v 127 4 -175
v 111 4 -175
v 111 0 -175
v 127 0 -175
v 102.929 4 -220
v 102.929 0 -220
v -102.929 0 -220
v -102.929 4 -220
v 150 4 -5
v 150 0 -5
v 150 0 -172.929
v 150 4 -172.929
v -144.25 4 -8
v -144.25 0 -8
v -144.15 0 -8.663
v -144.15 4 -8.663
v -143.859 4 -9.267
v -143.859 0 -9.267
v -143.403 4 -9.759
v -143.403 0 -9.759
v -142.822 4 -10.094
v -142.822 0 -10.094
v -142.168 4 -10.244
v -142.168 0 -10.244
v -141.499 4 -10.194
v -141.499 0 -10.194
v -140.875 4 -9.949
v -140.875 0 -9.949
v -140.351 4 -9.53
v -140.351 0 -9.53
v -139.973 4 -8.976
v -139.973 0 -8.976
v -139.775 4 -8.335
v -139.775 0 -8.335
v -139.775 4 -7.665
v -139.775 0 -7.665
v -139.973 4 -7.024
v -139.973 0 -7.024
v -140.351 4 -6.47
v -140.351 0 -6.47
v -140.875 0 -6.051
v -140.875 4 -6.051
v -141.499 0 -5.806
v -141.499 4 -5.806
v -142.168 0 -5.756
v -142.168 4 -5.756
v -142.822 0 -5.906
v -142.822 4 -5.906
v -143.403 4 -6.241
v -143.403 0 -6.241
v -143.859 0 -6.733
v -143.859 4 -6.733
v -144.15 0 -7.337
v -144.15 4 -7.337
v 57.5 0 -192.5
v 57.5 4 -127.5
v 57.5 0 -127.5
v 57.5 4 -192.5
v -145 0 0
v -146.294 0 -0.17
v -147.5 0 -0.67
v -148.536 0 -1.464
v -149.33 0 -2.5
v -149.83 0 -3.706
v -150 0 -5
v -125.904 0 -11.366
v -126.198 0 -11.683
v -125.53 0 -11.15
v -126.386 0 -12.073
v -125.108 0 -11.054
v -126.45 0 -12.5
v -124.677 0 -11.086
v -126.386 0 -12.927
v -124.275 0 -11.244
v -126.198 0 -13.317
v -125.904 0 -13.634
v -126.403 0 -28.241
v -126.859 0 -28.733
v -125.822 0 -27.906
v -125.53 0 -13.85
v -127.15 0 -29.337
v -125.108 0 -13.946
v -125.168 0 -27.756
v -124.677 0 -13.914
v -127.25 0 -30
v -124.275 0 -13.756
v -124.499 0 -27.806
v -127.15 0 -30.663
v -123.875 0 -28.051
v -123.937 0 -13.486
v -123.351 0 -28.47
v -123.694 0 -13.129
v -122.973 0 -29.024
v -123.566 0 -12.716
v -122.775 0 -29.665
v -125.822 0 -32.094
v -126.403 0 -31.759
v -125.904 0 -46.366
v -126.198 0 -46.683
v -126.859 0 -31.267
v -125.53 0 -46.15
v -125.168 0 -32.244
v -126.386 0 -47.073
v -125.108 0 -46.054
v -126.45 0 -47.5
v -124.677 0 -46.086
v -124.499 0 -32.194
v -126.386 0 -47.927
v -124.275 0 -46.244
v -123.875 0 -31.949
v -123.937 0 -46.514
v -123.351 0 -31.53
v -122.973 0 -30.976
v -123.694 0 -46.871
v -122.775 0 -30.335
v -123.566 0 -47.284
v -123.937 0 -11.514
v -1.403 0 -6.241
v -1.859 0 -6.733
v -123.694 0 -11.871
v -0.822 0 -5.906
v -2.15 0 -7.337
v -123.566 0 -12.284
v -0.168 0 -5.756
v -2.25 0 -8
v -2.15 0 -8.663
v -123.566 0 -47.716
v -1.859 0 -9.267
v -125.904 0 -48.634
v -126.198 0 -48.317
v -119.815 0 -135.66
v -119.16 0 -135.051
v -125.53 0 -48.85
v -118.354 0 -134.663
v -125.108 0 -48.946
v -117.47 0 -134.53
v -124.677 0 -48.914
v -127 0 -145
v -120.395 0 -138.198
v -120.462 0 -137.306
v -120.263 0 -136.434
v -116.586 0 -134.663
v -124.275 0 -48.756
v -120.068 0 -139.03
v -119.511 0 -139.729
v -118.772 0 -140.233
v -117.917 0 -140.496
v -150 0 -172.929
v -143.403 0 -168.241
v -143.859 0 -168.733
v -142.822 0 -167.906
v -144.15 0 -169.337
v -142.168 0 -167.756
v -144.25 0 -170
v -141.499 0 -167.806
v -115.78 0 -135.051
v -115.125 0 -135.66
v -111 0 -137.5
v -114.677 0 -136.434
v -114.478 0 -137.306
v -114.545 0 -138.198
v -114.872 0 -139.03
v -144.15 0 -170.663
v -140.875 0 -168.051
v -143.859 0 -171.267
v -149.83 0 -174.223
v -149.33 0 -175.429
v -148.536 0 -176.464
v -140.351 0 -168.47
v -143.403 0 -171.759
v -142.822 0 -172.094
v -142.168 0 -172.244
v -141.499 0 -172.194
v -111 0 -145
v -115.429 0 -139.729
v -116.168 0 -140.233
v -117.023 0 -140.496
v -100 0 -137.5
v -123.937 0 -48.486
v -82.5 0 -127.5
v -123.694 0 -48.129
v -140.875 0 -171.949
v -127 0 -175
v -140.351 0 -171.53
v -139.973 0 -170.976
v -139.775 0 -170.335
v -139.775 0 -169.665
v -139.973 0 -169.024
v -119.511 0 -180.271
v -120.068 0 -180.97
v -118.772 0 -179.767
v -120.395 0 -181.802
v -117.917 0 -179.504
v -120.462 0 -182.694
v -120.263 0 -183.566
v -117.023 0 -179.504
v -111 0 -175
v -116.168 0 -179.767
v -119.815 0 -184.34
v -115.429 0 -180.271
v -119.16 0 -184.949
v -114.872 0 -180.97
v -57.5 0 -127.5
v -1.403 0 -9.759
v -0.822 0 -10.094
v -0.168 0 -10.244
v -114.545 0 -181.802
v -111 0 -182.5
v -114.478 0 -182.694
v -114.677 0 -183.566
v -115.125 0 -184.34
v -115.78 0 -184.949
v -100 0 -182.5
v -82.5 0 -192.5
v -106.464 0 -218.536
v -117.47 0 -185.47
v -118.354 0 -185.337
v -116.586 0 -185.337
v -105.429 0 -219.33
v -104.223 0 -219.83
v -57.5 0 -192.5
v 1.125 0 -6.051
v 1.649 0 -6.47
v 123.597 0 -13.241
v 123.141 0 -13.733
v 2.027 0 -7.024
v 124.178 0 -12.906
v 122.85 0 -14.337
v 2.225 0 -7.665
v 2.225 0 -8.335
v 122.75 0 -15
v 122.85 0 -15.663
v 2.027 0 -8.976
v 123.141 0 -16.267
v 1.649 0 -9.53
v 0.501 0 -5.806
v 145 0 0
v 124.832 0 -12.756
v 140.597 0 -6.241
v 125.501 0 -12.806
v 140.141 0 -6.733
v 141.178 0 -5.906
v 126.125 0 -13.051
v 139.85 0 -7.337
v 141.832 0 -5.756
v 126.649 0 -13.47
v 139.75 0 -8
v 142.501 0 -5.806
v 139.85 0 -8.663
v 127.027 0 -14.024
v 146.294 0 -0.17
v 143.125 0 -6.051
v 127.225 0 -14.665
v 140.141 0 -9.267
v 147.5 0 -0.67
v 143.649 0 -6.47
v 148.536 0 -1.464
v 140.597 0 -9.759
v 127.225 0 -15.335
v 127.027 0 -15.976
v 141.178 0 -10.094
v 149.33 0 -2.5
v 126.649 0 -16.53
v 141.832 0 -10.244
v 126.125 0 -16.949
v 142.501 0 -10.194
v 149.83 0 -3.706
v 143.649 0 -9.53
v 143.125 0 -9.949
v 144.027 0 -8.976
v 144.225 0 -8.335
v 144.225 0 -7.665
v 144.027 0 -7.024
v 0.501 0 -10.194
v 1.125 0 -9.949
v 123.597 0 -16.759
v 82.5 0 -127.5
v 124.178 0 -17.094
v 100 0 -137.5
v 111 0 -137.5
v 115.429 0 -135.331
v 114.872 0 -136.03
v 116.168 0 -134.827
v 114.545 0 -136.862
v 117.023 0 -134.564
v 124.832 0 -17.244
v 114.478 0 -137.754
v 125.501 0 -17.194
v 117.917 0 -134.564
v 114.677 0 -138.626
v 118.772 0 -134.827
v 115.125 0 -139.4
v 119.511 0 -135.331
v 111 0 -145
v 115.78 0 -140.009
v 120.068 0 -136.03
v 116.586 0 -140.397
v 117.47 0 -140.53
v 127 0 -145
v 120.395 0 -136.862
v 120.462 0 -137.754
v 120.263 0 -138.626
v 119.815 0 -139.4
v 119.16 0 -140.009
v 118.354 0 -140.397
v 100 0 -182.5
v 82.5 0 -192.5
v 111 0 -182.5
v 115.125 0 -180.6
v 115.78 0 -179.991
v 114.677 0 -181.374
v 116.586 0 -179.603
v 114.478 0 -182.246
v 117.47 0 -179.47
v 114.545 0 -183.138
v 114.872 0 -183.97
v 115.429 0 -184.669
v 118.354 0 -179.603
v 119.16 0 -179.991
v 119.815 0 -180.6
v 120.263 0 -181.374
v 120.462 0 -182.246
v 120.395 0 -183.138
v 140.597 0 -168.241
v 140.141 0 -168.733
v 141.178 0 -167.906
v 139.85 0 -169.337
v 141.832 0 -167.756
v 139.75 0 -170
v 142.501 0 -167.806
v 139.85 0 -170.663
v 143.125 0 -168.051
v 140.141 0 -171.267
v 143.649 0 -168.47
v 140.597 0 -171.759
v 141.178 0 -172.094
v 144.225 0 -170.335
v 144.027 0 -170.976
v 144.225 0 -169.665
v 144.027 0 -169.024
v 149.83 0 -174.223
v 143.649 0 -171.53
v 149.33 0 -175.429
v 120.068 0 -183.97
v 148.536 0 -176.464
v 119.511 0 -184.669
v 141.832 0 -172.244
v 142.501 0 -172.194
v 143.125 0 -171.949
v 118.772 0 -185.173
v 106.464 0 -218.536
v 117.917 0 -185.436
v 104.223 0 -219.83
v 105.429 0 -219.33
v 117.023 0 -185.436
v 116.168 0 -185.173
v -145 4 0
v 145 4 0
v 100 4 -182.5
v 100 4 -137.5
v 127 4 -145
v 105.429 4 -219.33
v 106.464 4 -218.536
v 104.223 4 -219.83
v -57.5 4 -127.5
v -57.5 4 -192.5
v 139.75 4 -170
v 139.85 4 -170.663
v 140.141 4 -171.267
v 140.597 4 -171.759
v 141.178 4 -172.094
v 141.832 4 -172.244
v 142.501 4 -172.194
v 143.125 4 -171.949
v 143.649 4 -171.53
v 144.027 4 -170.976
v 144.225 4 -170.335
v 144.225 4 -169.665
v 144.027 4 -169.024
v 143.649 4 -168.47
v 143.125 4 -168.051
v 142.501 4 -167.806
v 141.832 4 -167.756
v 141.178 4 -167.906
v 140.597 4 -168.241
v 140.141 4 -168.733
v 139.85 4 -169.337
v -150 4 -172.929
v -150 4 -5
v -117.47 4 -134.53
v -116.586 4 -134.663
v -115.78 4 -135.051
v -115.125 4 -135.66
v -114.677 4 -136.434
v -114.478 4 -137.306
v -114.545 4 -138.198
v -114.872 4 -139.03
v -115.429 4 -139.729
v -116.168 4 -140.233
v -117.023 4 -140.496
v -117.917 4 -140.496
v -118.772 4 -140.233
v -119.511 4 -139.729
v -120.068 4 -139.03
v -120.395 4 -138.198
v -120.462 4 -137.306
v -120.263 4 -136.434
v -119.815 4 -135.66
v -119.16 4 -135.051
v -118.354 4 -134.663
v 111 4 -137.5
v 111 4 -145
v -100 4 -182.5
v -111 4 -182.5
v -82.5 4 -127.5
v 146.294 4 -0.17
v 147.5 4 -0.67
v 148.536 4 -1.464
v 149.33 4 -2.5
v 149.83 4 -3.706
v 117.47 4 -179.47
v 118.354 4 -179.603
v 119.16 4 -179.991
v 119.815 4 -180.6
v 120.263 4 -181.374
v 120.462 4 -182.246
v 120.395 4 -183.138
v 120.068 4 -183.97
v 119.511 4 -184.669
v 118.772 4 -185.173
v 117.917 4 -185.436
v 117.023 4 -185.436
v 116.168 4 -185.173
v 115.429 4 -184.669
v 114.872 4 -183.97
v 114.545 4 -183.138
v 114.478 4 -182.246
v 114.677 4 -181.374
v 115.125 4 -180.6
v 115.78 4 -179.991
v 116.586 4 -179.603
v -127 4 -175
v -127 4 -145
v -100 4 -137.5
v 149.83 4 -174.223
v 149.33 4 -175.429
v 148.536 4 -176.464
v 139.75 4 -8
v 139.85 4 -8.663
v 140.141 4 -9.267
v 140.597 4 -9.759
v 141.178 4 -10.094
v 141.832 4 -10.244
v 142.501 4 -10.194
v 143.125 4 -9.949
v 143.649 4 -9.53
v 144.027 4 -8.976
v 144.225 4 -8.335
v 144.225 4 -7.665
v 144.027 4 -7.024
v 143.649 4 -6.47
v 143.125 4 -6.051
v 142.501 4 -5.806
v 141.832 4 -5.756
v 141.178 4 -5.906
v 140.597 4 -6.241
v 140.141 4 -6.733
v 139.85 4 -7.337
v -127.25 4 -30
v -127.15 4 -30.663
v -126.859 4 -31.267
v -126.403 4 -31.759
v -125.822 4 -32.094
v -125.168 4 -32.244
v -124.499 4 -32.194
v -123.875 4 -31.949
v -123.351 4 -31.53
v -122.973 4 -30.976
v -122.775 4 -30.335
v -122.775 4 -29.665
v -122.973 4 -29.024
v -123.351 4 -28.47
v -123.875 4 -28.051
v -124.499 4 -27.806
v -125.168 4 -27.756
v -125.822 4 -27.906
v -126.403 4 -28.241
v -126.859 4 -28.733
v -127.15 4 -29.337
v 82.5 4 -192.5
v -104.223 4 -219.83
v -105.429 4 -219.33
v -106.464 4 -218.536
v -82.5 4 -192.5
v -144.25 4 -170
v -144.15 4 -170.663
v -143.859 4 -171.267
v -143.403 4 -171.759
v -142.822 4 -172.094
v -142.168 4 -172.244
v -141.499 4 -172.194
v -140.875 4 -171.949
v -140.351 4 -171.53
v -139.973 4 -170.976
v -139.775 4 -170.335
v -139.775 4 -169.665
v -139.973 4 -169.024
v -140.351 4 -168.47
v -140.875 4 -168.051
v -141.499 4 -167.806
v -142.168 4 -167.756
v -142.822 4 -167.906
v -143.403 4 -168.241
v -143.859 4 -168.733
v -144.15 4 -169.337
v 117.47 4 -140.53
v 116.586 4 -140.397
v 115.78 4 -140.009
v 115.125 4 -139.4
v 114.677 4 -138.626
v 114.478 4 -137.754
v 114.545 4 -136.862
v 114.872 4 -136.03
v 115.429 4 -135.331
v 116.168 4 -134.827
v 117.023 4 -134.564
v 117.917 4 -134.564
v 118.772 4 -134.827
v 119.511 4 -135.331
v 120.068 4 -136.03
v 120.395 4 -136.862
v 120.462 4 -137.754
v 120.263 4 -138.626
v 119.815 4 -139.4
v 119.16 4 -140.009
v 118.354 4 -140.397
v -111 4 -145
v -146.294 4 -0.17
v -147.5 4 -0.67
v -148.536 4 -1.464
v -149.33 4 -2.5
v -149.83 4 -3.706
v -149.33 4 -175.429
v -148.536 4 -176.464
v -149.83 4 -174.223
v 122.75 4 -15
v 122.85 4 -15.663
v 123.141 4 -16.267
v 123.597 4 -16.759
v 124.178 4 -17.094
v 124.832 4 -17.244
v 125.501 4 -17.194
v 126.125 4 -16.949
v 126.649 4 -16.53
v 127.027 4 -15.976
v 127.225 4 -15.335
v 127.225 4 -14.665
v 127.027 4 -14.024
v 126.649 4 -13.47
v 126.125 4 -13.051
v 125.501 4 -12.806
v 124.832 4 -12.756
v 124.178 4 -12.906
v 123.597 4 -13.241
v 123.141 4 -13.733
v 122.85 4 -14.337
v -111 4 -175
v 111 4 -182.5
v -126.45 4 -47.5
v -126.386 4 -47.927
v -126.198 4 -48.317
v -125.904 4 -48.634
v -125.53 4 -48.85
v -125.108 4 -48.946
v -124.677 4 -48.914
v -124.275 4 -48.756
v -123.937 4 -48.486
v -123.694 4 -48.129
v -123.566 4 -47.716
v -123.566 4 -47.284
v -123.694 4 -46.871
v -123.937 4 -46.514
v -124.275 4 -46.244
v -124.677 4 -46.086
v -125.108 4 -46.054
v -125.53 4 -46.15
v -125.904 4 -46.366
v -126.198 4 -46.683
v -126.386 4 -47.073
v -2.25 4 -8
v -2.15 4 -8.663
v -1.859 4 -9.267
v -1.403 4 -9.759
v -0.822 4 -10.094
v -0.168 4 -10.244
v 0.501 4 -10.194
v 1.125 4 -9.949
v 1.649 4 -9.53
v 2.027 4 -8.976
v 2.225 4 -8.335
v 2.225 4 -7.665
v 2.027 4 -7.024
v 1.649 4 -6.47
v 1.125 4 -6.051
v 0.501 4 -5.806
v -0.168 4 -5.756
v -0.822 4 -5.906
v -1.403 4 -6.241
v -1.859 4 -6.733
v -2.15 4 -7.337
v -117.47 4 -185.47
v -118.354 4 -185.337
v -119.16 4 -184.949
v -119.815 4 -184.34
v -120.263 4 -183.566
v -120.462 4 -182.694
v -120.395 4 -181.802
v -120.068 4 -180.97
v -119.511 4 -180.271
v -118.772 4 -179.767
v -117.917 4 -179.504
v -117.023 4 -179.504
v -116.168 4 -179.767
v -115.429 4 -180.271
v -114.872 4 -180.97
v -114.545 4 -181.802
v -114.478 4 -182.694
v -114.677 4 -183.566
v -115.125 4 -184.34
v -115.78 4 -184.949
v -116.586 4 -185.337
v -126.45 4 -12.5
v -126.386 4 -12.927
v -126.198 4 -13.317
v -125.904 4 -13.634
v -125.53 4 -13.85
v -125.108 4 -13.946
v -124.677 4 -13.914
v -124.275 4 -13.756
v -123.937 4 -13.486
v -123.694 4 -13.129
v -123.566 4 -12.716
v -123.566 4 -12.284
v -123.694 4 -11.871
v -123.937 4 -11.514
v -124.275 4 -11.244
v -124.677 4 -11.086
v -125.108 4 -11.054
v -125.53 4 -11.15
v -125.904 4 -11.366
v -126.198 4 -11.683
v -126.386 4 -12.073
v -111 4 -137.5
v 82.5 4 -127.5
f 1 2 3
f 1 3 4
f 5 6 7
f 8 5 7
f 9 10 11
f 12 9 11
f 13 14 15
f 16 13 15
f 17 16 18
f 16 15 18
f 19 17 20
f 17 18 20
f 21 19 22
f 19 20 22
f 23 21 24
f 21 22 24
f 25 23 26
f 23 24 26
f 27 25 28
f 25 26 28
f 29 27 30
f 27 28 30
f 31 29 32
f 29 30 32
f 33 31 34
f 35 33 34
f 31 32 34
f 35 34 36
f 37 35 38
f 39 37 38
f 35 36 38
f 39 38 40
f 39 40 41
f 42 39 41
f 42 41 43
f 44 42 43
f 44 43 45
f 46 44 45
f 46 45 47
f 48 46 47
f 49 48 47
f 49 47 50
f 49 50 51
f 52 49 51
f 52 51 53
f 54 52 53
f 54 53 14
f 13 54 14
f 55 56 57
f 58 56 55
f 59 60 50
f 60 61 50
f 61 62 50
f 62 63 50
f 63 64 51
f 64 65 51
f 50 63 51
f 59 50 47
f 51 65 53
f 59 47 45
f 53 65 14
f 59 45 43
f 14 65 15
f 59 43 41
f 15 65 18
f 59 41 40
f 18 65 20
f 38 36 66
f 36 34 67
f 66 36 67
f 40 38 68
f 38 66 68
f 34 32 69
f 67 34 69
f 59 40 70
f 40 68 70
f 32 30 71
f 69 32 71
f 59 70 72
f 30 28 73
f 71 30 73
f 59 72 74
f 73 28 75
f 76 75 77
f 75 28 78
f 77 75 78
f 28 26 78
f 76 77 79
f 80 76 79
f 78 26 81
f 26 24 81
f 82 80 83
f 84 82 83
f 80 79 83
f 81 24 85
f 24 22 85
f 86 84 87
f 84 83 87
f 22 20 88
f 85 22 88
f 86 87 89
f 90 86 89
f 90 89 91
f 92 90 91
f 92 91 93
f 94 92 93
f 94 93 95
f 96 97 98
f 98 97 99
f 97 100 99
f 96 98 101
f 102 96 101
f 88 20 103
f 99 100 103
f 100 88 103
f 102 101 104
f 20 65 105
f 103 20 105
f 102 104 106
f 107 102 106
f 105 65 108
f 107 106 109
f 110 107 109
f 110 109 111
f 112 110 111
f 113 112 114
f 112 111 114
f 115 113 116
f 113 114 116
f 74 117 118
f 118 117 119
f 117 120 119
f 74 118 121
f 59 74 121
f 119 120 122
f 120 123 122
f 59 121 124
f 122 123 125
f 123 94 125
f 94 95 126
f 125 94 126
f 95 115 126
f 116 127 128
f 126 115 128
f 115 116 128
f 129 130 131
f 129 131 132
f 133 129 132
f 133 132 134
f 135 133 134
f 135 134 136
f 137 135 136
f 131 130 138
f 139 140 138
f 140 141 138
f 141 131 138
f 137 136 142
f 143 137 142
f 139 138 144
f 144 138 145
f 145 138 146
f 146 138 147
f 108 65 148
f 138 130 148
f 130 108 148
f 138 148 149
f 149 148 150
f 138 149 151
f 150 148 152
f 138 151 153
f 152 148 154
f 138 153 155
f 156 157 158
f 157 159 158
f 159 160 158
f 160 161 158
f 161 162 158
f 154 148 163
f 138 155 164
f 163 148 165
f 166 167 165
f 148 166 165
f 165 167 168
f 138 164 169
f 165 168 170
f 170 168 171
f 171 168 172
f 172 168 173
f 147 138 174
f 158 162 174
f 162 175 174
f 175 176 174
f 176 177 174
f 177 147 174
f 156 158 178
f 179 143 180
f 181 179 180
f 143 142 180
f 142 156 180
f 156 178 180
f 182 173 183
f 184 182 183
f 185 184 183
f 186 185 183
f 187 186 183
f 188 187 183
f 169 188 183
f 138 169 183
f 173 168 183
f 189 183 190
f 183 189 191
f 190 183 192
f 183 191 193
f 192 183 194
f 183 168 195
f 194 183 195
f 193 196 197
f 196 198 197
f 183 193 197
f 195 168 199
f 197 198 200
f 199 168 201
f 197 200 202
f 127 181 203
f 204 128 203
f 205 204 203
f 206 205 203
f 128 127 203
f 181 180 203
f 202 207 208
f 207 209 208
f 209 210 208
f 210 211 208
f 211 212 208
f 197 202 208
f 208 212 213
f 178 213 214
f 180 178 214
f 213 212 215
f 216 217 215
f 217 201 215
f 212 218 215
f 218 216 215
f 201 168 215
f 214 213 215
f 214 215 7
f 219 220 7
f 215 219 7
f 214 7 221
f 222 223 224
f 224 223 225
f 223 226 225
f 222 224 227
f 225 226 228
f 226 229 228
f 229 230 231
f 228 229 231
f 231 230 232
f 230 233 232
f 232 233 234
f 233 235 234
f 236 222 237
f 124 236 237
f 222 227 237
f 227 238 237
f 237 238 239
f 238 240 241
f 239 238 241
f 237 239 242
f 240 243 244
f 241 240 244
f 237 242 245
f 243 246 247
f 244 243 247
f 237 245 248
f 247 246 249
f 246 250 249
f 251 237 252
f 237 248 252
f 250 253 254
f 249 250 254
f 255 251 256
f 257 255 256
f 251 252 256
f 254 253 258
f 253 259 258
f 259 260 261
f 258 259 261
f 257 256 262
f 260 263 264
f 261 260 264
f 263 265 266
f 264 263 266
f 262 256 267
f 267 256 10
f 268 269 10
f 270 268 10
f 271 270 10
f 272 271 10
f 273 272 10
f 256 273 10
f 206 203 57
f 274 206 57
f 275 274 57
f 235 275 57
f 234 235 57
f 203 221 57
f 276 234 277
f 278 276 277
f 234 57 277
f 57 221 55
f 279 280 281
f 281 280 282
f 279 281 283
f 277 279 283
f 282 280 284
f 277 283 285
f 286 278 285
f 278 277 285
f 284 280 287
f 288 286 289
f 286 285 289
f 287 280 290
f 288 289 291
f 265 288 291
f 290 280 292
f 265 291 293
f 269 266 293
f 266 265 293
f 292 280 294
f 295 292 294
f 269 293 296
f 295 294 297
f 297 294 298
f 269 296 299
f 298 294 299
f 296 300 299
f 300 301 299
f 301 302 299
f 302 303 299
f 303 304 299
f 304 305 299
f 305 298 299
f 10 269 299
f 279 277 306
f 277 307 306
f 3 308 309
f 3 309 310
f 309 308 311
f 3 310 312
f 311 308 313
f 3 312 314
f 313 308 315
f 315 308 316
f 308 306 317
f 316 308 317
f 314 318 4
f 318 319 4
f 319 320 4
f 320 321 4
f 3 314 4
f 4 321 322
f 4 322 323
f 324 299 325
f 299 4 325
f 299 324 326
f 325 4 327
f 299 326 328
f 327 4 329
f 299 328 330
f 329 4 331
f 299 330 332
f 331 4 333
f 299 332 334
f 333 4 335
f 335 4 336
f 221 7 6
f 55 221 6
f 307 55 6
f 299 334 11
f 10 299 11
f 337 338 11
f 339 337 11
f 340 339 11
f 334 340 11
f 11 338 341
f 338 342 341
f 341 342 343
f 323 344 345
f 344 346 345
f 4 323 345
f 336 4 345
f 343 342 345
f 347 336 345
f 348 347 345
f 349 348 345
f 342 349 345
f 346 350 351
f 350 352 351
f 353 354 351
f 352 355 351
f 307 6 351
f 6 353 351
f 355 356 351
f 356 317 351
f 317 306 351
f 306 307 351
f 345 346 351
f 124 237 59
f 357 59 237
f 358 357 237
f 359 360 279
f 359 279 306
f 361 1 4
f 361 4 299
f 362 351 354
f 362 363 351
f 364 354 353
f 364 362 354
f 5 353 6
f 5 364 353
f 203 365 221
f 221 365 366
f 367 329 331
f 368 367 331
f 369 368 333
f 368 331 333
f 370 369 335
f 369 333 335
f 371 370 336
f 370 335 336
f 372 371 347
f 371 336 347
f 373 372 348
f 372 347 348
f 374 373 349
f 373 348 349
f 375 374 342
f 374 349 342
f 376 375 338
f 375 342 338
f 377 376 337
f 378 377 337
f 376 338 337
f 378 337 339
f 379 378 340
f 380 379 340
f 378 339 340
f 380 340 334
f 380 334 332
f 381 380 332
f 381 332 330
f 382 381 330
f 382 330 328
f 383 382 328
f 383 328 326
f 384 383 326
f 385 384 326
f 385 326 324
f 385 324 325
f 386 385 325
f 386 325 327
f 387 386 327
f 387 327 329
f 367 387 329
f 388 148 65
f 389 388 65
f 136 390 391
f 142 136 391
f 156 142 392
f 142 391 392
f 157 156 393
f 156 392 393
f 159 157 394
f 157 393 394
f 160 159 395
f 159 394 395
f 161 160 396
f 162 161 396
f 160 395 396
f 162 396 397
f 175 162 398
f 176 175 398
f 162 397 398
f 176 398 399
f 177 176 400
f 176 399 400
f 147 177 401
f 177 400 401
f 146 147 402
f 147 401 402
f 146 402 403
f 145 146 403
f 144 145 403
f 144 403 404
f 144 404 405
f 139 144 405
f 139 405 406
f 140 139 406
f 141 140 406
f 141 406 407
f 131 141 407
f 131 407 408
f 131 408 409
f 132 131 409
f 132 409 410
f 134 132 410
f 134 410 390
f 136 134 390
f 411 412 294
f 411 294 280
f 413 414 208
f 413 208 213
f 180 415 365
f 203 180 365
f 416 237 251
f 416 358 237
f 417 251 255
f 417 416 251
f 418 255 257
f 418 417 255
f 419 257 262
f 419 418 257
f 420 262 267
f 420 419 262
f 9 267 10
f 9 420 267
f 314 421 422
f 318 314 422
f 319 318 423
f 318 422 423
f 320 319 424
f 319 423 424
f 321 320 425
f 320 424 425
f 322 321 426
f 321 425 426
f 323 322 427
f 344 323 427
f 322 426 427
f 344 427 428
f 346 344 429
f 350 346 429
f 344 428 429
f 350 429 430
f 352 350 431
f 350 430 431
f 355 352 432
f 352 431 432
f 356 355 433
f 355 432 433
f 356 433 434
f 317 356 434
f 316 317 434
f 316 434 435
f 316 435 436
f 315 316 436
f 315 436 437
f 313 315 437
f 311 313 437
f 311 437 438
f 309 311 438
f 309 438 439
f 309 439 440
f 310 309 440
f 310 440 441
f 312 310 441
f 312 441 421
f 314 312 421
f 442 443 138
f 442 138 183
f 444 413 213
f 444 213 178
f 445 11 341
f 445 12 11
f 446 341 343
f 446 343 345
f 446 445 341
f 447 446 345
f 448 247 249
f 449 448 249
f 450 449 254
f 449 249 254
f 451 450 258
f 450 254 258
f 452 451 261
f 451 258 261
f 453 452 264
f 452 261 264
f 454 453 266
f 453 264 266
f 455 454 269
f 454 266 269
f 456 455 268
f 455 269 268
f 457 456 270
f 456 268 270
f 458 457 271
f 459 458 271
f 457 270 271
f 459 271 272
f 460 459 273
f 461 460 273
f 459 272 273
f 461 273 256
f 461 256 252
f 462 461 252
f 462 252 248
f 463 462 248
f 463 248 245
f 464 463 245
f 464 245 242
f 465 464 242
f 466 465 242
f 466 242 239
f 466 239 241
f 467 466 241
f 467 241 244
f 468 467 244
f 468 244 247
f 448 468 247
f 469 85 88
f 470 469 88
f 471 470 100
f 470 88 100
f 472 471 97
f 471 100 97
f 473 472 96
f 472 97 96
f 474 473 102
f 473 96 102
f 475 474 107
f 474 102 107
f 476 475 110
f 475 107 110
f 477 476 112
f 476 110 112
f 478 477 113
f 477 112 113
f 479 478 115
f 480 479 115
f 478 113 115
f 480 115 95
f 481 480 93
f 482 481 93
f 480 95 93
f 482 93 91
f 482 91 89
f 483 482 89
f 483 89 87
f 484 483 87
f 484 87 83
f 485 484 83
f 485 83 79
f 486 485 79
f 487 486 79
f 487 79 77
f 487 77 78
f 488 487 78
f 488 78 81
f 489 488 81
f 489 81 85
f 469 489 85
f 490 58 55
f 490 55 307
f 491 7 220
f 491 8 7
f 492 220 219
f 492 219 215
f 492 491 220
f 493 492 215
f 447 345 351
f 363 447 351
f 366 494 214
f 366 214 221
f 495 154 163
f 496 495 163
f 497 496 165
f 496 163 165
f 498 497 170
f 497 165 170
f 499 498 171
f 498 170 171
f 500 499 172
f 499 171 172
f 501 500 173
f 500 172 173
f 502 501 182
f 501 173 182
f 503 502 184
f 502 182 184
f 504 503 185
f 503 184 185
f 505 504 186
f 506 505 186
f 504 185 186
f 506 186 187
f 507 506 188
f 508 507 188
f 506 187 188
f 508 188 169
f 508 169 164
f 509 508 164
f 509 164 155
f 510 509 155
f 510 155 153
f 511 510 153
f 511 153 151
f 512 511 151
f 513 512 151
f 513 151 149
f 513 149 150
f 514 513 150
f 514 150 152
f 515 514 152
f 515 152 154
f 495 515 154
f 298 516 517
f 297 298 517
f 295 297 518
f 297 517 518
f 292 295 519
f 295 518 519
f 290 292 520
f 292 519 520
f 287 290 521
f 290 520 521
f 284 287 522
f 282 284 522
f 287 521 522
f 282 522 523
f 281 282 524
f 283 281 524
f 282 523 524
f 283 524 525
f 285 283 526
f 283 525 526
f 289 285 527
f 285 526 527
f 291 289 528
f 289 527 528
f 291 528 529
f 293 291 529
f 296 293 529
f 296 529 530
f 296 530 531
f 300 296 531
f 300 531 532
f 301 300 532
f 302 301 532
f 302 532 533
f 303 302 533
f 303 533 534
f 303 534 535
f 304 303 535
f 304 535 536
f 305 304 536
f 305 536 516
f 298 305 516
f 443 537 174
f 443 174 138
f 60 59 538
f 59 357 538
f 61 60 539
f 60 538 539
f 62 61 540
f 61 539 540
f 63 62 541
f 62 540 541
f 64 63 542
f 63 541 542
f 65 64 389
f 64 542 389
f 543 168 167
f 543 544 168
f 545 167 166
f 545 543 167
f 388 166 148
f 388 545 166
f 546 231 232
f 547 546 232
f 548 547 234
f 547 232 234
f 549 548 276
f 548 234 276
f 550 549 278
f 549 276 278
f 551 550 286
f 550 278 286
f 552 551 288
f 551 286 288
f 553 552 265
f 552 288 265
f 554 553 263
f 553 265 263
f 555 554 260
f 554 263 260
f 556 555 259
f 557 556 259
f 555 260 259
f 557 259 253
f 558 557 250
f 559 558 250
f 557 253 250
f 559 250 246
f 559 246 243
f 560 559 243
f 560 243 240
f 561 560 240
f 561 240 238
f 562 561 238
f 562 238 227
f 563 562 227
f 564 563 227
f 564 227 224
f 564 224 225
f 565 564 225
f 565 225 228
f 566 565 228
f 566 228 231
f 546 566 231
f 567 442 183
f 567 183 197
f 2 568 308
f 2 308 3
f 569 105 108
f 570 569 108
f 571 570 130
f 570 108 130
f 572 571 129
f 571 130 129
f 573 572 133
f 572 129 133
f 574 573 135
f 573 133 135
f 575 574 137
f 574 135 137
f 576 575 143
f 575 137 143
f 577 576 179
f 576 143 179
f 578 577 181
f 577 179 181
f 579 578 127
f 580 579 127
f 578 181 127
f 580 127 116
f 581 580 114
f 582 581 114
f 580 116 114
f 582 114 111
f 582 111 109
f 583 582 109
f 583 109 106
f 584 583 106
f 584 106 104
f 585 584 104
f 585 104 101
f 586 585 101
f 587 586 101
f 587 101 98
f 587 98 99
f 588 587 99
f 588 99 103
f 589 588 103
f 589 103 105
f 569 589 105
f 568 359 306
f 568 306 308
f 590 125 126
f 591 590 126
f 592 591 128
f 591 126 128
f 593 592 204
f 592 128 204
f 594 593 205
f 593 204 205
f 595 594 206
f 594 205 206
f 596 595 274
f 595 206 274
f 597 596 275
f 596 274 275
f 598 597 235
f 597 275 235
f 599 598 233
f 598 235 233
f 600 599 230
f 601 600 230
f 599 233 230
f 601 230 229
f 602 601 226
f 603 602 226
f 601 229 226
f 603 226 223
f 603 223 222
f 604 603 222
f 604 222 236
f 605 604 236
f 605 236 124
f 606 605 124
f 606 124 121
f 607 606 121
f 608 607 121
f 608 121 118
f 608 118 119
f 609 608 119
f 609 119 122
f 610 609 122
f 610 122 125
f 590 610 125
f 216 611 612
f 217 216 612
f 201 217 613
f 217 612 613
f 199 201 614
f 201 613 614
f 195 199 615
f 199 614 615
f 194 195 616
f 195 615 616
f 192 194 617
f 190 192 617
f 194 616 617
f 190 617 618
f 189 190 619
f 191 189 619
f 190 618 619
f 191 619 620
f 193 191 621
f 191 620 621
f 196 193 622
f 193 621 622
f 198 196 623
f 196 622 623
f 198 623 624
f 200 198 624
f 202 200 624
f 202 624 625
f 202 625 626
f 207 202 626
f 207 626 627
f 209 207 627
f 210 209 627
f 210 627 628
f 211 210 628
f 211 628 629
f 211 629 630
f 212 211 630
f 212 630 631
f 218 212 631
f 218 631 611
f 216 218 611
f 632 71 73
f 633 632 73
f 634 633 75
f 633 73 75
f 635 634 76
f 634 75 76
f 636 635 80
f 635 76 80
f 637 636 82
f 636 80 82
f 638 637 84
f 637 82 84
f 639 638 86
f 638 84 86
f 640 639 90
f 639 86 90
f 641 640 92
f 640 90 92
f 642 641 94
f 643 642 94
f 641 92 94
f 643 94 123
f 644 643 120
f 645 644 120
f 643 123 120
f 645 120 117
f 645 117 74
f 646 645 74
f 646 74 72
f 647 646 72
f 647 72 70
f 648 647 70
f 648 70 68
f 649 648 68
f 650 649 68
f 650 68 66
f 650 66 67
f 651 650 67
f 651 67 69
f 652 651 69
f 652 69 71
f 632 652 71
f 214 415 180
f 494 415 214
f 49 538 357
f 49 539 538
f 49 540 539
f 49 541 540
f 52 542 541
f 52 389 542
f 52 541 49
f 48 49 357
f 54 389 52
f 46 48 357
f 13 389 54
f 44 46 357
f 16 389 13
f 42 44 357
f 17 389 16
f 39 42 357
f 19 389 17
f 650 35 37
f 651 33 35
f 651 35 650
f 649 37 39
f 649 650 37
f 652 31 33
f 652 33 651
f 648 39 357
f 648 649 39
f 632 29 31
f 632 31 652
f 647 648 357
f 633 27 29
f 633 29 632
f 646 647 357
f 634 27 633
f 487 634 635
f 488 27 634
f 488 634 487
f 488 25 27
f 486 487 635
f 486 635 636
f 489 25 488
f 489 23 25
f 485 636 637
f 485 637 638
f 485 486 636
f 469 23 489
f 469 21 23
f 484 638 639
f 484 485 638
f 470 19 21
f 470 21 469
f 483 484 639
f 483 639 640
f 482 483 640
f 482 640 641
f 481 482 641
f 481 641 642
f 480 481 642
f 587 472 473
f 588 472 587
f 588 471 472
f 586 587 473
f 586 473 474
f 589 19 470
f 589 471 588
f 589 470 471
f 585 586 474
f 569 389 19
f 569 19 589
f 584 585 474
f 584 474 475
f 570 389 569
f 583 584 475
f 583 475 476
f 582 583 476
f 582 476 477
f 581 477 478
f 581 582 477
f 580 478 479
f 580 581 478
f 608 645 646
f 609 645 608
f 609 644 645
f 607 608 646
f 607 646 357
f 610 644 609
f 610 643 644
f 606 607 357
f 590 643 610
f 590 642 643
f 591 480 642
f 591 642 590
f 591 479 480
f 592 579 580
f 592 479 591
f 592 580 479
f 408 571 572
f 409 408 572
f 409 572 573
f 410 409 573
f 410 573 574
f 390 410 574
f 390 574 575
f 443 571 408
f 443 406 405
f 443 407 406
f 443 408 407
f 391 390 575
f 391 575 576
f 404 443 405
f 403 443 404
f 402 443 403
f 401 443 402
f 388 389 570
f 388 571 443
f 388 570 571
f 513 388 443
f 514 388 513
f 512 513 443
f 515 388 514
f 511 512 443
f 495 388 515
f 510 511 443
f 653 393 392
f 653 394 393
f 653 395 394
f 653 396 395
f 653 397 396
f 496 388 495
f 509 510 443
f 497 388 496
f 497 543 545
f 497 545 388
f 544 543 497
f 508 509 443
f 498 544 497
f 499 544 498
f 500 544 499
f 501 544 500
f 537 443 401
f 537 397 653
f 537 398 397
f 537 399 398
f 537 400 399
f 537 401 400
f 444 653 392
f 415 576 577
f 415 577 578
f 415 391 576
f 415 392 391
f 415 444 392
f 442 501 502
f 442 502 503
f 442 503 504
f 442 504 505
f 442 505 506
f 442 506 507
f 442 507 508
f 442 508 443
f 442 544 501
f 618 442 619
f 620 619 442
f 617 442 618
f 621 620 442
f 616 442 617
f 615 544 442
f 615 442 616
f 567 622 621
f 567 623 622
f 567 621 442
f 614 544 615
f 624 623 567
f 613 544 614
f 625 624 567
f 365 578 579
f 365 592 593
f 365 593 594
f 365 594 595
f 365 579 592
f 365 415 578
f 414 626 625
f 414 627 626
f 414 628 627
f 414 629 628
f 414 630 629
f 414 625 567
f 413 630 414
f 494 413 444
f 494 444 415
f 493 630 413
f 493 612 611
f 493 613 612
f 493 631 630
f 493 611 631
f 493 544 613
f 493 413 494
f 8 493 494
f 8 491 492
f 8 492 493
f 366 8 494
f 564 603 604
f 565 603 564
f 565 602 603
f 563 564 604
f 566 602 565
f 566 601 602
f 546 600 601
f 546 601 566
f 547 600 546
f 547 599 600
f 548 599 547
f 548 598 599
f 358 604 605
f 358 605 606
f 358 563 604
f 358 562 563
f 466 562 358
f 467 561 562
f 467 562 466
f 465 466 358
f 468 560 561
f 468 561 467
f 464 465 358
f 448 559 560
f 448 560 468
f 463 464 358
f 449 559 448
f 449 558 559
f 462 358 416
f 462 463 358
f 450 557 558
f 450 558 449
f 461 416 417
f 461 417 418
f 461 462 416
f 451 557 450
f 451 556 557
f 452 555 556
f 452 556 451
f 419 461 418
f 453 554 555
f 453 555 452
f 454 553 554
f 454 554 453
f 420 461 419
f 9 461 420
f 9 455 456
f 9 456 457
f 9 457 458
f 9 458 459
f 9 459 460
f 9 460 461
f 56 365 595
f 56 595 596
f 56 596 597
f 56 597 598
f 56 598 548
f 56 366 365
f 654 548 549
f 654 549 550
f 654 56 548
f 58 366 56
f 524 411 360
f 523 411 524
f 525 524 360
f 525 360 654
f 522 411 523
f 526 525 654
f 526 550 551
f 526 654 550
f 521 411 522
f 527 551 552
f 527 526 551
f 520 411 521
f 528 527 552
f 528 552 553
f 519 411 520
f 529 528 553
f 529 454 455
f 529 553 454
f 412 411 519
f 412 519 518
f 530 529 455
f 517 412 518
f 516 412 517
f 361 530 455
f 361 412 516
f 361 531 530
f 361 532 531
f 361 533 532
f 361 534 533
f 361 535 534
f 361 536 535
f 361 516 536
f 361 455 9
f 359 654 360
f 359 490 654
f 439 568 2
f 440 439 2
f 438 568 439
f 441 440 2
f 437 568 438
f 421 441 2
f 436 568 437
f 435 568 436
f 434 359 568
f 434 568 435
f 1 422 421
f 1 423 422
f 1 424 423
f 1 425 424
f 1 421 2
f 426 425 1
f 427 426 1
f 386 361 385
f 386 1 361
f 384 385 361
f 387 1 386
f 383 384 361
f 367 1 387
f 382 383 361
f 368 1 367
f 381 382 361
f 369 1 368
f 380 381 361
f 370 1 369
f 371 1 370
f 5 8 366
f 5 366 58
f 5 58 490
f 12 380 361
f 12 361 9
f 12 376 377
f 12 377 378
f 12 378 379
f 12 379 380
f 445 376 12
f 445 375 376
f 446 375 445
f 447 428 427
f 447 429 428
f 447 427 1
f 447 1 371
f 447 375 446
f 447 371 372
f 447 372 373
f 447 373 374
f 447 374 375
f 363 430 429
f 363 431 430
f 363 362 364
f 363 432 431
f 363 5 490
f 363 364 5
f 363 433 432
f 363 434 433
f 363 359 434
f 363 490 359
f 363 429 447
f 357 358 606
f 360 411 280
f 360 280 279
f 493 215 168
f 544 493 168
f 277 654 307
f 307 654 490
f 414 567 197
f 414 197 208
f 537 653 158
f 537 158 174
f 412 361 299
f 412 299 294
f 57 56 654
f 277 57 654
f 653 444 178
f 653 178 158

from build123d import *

# Parameters (mm, degrees)
MAIN_EXTRUSION_DEPTH    = 4
CORNER_LEAVE_R          = 5
ESQUISSE2_R             = 3
ESQUISSE2_W             = 25
ESQUISSE2_H             = 65
ENL_V_MAT_EXTRU_1_DEPTH = 267.30058205
D_GAGEMENT_M41_D        = 4.5
D_GAGEMENT_M42_D        = 4.5
D_GAGEMENT_M2_51_D      = 2.9


with BuildPart() as part:
    # Main scetch → Main extrusion (new body)
    with BuildSketch(Plane(origin=(0, 0, 0), x_dir=(1, 0, 0), z_dir=(0, 1, 0))):
        Polygon((-150, 0), (150, 0), (150, 175), (105, 220), (-105, 220), (-150, 175), align=None)
    extrude(amount=MAIN_EXTRUSION_DEPTH)

    # Corner leave
    corner_leave_edges = [part.edges().sort_by_distance(p)[0] for p in [
        (150, 2, 0),
        (-150, 2, 0),
        (-150, 2, -175),
        (-105, 2, -220),
        (105, 2, -220),
        (150, 2, -175),
    ]]
    fillet(corner_leave_edges, radius=CORNER_LEAVE_R)

    # Esquisse2 → Enlèv. mat.-Extru.1 (cut, through all)
    with BuildSketch(Plane(origin=(0, 4, 0), x_dir=(1, 0, 0), z_dir=(0, 1, 0))):
        with Locations(Location((117.47, 182.47, 0), (0, 0, 270))):
            Circle(ESQUISSE2_R)
        with Locations(Location((117.47, 137.53, 0), (0, 0, 90))):
            Circle(ESQUISSE2_R)
        with Locations(Location((-117.47, 137.53, 0), (0, 0, 270))):
            Circle(ESQUISSE2_R)
        with Locations(Location((-117.47, 182.47, 0), (0, 0, 90))):
            Circle(ESQUISSE2_R)
        with Locations((70, 160)):
            Rectangle(ESQUISSE2_W, ESQUISSE2_H)
        Polygon((100, 137.5), (100, 182.5), (111, 182.5), (111, 175), (127, 175), (127, 145), (111, 145), (111, 137.5), align=None)
        Polygon((-111, 137.5), (-111, 145), (-127, 145), (-127, 175), (-111, 175), (-111, 182.5), (-100, 182.5), (-100, 137.5), align=None)
        with Locations((-70, 160)):
            Rectangle(ESQUISSE2_W, ESQUISSE2_H)
    extrude(amount=-ENL_V_MAT_EXTRU_1_DEPTH, mode=Mode.SUBTRACT)

    # Dégagement M41 (through all)
    with Locations(Plane(origin=(0, 4, 0), x_dir=(1, 0, 0), z_dir=(0, 1, 0))):
        with Locations((-125, 30), (125, 15)):
            Hole(D_GAGEMENT_M41_D / 2)

    # Dégagement M42 (through all)
    with Locations(Plane(origin=(0, 4, 0), x_dir=(1, 0, 0), z_dir=(0, 1, 0))):
        with Locations((-142, 8), (0, 8), (142, 8), (142, 170), (-142, 170)):
            Hole(D_GAGEMENT_M42_D / 2)

    # Dégagement M2.51 (through all)
    with Locations(Plane(origin=(0, 4, 0), x_dir=(1, 0, 0), z_dir=(0, 1, 0))):
        with Locations((-125, 47.5), (-125, 12.5)):
            Hole(D_GAGEMENT_M2_51_D / 2)


solid = part.part
